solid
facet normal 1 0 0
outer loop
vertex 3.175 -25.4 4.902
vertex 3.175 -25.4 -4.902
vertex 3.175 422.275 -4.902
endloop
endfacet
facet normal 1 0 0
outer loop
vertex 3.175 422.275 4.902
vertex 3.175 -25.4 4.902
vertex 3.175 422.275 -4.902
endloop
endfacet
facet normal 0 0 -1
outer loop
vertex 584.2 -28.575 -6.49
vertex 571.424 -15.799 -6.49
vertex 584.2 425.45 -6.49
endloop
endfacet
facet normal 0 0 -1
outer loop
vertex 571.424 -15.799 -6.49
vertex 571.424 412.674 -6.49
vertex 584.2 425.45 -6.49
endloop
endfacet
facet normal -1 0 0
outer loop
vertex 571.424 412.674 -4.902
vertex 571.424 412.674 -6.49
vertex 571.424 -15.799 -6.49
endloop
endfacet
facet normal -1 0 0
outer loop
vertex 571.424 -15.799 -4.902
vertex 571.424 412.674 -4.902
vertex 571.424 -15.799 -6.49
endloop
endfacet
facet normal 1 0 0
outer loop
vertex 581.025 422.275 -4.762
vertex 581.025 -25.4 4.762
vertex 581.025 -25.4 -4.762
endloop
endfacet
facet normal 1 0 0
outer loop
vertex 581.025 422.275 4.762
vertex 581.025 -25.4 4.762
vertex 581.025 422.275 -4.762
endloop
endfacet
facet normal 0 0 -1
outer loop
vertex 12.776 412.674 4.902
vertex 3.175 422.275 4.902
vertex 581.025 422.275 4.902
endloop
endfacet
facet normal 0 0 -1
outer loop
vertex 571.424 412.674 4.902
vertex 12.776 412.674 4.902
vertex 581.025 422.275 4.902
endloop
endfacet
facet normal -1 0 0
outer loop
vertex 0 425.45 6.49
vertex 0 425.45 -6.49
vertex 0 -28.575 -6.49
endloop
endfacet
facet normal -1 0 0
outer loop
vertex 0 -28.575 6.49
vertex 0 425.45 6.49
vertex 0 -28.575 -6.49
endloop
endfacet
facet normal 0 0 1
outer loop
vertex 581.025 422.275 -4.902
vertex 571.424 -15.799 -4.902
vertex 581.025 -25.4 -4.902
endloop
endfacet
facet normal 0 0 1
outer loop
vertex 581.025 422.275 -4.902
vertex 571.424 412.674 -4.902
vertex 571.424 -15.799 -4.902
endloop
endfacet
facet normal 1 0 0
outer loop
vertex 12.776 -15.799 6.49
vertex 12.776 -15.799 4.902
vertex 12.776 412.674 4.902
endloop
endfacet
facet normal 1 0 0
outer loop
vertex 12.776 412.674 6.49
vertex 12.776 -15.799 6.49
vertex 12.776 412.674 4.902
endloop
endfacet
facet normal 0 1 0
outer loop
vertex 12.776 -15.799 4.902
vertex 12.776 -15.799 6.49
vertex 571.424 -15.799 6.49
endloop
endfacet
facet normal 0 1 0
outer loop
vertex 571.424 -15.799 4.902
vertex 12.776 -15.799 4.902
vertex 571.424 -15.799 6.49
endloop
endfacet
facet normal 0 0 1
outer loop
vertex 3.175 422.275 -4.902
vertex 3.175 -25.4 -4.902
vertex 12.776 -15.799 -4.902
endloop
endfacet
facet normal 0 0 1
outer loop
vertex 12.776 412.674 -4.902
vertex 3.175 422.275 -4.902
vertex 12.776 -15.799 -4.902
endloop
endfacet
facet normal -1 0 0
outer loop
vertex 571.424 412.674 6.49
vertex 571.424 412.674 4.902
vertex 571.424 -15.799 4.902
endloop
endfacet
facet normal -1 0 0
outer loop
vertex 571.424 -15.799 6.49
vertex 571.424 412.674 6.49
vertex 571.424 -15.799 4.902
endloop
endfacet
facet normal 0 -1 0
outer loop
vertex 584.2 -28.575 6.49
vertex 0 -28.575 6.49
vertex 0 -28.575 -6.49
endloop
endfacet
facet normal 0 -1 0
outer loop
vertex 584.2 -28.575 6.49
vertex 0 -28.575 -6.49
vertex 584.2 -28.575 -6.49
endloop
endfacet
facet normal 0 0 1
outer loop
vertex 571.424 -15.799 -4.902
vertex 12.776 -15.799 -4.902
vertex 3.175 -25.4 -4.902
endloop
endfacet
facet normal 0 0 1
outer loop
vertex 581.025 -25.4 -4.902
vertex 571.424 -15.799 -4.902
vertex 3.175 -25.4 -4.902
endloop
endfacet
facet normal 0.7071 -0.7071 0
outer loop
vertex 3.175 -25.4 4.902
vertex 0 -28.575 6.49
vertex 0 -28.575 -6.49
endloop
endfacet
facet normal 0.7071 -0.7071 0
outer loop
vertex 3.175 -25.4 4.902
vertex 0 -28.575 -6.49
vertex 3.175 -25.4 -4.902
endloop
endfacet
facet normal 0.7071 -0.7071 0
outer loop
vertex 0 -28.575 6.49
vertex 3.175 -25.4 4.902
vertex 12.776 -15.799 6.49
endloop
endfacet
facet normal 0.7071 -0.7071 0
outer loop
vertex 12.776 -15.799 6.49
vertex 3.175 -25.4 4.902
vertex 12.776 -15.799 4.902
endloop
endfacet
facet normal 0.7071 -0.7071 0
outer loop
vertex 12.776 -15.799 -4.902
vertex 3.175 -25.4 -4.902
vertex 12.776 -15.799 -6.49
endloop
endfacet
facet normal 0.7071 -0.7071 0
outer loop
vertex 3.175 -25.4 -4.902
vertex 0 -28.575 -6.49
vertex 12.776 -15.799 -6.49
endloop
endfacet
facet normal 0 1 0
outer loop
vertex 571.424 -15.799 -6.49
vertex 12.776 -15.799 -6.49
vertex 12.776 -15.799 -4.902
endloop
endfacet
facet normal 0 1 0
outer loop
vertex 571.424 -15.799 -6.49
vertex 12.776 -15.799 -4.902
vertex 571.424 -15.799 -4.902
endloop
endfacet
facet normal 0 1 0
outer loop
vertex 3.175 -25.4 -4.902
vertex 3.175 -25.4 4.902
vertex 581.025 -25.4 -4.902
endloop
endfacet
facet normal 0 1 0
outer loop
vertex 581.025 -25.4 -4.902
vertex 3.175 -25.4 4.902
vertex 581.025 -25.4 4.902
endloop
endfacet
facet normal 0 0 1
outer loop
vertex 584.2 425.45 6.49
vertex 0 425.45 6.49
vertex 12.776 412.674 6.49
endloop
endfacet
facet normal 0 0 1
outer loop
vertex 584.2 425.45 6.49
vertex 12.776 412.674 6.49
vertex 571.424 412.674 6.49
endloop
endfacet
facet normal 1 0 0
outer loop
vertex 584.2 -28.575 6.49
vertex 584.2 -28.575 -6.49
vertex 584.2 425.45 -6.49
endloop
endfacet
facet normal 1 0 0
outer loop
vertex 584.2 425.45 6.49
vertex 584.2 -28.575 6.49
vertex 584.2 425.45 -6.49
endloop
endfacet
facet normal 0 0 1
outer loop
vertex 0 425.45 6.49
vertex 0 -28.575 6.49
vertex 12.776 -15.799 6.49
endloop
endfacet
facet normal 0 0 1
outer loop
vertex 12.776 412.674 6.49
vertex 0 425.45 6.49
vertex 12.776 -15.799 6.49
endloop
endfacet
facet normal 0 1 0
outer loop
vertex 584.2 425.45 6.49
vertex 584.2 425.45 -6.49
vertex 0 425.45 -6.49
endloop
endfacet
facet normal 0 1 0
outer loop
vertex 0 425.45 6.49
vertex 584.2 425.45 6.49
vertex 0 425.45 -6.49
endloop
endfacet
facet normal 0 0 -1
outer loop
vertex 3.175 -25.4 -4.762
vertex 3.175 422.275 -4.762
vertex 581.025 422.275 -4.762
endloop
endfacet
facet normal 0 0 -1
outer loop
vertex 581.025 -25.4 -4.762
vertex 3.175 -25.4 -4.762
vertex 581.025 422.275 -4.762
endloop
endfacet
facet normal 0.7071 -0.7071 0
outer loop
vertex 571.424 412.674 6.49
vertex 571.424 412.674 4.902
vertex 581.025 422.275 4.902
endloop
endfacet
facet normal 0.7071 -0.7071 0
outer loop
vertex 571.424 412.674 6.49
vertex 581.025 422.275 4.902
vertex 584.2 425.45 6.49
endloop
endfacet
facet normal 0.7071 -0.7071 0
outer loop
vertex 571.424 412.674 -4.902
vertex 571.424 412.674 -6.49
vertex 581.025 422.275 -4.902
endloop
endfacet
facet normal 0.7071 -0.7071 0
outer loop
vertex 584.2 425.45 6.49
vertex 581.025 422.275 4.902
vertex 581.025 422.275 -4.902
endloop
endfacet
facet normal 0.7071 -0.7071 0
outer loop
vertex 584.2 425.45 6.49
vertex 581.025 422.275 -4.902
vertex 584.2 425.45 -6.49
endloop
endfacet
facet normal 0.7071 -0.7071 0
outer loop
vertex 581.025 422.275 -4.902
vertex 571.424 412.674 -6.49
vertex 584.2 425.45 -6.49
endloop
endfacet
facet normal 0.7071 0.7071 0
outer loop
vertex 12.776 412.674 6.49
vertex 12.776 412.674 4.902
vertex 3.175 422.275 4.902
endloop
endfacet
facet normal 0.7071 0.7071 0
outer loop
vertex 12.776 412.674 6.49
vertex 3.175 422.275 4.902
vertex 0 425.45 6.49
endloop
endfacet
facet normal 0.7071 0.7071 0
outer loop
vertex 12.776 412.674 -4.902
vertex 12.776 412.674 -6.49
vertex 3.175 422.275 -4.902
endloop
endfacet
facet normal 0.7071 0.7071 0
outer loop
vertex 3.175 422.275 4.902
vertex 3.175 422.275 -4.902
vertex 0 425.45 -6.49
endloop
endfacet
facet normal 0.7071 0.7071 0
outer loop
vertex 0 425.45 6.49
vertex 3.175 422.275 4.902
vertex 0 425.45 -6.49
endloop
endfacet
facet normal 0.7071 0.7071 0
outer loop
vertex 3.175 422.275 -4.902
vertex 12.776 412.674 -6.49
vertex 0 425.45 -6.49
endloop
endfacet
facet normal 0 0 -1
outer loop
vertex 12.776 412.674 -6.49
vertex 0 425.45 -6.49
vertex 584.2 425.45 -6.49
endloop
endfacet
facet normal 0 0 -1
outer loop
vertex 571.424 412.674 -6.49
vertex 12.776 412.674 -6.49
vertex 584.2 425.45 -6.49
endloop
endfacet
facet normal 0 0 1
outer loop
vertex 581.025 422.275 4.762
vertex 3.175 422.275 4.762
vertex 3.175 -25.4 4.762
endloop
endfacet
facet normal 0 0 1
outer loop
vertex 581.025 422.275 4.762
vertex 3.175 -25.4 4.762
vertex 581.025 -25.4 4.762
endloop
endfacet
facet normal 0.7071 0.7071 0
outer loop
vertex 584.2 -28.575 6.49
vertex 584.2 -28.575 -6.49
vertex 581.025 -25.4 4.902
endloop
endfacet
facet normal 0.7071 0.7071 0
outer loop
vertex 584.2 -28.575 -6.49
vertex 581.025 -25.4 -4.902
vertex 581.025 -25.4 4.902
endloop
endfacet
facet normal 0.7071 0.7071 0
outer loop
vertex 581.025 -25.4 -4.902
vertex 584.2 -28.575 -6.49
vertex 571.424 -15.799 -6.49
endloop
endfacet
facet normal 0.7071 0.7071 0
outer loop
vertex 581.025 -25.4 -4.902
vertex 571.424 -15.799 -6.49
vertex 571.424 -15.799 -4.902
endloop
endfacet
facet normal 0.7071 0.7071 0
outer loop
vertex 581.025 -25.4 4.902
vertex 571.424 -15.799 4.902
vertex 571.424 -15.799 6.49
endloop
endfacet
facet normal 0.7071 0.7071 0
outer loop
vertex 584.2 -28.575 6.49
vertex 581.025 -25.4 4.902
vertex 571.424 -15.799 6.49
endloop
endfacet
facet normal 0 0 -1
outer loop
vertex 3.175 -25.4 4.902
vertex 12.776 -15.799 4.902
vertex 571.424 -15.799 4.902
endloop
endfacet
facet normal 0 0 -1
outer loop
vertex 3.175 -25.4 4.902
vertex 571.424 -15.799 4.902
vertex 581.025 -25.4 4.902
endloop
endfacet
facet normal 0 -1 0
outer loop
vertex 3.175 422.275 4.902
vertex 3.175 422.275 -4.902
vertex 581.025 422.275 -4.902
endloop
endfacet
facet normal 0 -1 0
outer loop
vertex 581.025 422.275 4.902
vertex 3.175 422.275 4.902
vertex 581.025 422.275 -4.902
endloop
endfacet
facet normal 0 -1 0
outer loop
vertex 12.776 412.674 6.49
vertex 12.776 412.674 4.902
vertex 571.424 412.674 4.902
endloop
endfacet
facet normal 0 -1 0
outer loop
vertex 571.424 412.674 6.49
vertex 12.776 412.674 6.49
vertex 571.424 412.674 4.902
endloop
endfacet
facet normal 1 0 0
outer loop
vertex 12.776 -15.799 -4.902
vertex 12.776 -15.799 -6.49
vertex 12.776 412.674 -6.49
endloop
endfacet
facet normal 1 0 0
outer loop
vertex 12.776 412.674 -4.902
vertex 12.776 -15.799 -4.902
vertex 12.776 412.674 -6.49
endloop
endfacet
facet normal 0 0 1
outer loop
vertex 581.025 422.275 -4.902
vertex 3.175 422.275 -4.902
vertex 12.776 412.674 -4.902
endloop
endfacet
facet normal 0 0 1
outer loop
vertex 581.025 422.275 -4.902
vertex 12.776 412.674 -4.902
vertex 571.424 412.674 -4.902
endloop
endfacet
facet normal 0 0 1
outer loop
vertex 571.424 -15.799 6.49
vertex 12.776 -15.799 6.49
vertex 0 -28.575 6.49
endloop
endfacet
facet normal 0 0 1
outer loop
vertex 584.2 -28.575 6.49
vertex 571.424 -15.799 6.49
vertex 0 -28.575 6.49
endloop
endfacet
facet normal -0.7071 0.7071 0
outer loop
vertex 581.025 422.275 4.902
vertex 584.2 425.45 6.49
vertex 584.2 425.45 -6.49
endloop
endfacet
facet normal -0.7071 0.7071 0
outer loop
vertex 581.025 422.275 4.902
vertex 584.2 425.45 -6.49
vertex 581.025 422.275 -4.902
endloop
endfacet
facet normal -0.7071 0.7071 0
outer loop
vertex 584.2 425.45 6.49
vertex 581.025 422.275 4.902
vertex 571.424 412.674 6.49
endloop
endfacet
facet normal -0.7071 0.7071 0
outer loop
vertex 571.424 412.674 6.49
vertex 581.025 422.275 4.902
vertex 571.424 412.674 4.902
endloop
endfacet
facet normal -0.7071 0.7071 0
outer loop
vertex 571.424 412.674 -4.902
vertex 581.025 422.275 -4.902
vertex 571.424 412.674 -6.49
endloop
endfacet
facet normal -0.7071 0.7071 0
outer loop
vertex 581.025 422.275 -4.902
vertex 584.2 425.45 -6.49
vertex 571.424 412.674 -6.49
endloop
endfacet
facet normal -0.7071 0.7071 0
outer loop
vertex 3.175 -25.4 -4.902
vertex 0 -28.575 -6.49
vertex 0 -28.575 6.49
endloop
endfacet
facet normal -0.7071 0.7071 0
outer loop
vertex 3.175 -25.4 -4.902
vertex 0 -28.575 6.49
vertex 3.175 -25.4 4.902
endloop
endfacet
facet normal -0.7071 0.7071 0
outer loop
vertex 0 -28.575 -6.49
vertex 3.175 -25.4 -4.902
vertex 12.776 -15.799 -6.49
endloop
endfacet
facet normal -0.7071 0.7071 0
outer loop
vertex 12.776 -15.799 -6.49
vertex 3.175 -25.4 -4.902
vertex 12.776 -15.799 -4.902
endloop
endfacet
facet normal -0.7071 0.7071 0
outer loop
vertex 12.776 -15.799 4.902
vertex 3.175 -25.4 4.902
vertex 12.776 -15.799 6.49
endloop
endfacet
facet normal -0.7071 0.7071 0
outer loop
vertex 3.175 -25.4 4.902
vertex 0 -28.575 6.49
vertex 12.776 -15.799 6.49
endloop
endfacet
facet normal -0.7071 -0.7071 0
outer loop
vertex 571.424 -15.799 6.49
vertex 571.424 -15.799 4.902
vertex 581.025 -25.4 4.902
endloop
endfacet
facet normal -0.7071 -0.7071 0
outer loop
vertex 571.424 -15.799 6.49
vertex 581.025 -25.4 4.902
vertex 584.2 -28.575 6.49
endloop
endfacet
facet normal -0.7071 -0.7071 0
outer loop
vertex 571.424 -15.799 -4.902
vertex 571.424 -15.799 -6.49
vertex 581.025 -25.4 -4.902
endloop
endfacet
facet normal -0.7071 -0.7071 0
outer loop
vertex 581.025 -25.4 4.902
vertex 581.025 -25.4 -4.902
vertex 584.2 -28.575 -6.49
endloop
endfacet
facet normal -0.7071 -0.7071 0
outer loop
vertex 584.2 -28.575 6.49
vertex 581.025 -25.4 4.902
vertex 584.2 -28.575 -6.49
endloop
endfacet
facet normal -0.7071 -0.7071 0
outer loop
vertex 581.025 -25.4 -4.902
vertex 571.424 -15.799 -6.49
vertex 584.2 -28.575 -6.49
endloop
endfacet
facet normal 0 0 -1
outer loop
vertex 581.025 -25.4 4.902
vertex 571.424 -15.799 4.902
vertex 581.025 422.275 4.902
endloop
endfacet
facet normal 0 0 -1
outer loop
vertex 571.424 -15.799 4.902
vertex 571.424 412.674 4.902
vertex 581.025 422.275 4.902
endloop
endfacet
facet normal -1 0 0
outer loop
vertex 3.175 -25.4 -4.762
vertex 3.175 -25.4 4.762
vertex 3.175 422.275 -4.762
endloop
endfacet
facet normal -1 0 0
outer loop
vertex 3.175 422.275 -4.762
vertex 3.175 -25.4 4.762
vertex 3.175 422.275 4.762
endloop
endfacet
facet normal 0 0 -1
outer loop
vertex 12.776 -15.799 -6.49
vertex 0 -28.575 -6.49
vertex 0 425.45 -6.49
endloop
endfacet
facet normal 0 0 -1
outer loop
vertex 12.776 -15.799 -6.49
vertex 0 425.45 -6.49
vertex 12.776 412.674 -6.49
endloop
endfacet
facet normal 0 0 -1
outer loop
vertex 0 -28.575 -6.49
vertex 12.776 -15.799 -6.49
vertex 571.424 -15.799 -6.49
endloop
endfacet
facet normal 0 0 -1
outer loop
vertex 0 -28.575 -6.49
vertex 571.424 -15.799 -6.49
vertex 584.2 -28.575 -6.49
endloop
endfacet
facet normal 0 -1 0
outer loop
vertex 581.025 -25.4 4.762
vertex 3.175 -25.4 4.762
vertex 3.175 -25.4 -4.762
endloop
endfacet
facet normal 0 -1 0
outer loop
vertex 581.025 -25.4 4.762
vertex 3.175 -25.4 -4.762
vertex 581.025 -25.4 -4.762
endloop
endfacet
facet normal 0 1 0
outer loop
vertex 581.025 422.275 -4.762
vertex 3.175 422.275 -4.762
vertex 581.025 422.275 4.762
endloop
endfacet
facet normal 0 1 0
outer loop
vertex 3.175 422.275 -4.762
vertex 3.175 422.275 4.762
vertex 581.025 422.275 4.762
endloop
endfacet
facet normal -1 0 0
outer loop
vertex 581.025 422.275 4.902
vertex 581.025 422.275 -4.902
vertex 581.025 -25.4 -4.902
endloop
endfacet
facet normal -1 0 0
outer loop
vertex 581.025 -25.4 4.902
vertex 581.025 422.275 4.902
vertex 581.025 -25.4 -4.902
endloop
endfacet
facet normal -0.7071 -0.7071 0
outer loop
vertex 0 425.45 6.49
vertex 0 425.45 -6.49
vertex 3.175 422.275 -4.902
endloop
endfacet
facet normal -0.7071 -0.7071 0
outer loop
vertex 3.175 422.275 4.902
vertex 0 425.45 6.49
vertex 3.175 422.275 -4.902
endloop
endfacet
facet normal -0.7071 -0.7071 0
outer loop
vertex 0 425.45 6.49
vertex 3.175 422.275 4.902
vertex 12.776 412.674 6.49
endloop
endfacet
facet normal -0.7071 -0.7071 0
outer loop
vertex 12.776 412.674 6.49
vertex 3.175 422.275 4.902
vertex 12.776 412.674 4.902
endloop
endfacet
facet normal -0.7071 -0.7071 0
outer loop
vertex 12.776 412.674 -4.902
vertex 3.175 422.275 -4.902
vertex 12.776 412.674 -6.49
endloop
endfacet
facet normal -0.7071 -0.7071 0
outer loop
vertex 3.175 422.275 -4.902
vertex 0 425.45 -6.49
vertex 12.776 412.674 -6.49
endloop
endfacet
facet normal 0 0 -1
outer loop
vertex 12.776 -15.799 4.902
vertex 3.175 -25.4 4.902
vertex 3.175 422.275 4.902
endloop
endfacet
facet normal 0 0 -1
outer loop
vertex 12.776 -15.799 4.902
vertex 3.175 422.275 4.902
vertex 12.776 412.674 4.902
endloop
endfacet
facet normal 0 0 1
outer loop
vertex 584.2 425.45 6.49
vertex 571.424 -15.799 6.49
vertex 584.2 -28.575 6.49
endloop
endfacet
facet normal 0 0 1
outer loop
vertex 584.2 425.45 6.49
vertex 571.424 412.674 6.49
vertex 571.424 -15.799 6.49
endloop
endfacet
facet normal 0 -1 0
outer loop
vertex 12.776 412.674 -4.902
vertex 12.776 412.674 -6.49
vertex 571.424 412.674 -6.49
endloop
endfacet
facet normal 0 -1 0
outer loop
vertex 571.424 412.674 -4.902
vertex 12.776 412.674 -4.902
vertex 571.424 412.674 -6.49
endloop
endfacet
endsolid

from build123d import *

# Parameters (mm, degrees)
SKETCH2_W           = 577.85
SKETCH2_H           = 447.675
BOSS_EXTRUDE1_DEPTH = 4.7625
SKETCH3_W           = 584.2
SKETCH3_H           = 454.025
SKETCH3_W_2         = 577.85
SKETCH3_H_2         = 447.675
BOSS_EXTRUDE2_DEPTH = 6.4897
SKETCH4_W           = 584.2
SKETCH4_H           = 454.025
SKETCH4_W_2         = 558.6476
SKETCH4_H_2         = 428.4726
BOSS_EXTRUDE3_DEPTH = 1.5875
SPLIT1_START        = -6.4897
SPLIT1_DEPTH        = 12.9794
SPLIT1_2_DEPTH      = 1.5875
SPLIT1_START_2      = 4.9022
SPLIT1_3_DEPTH      = 1.5875
SPLIT1_4_DEPTH      = 12.9794
SPLIT1_5_DEPTH      = 1.5875
SPLIT1_6_DEPTH      = 1.5875
SPLIT1_7_DEPTH      = 12.9794
SPLIT1_8_DEPTH      = 1.5875
SPLIT1_9_DEPTH      = 1.5875
SPLIT1_START_3      = -282.77030474
SPLIT1_10_OUTLINE_W = 322.113794703
SPLIT1_10_OUTLINE_H = 12.9794
SPLIT1_10_DEPTH     = 716.067662582
SPLIT1_START_4      = -300.838580056
SPLIT1_11_OUTLINE_W = 414.886205297
SPLIT1_11_OUTLINE_H = 12.9794
SPLIT1_11_DEPTH     = 321.044156328


# Read off the part's stored shape, not the designer's step: Split1
with BuildPart() as part:
    # Sketch2 → Boss-Extrude1 (new, symmetric)
    with BuildSketch(Plane.XY):
        with Locations((292.1, 198.4375)):
            Rectangle(SKETCH2_W, SKETCH2_H)
    extrude(amount=BOSS_EXTRUDE1_DEPTH, both=True)


with BuildPart() as body_2:
    # Sketch3 → Boss-Extrude2 (new, symmetric)
    with BuildSketch(Plane.XY):
        with Locations((292.1, 198.4375)):
            Rectangle(SKETCH3_W, SKETCH3_H)
        with Locations((292.1, 198.4375)):
            Rectangle(SKETCH3_W_2, SKETCH3_H_2, mode=Mode.SUBTRACT)
    extrude(amount=BOSS_EXTRUDE2_DEPTH, both=True)

    # Sketch4 → Boss-Extrude3 (add)
    with BuildSketch(Plane.XY.offset(6.4897)):
        with Locations((292.1, 198.4375)):
            Rectangle(SKETCH4_W, SKETCH4_H)
        with Locations((292.1, 198.4375)):
            Rectangle(SKETCH4_W_2, SKETCH4_H_2, mode=Mode.SUBTRACT)
    boss_extrude3 = extrude(amount=-BOSS_EXTRUDE3_DEPTH)

    # Mirror1: Boss-Extrude3 across plane
    add(boss_extrude3.mirror(Plane.XY))

    # Split1 10 outline → Split1 10 (cut)
    with BuildSketch(Plane(origin=(0, 0, 0), x_dir=(0.707106781186548, 0.707106781186547, 0), z_dir=(0.707106781186547, -0.707106781186548, 0)).offset(SPLIT1_START_3)):
        with Locations((553.943102649, 0)):
            Rectangle(SPLIT1_10_OUTLINE_W, SPLIT1_10_OUTLINE_H)
    extrude(amount=SPLIT1_10_DEPTH, mode=Mode.SUBTRACT)

    # Split1 11 outline → Split1 11 (cut)
    with BuildSketch(Plane(origin=(0, 0, 0), x_dir=(0.707106781186548, 0.707106781186547, 0), z_dir=(0.707106781186547, -0.707106781186548, 0)).offset(SPLIT1_START_4)):
        with Locations((185.443102649, 0)):
            Rectangle(SPLIT1_11_OUTLINE_W, SPLIT1_11_OUTLINE_H)
    extrude(amount=SPLIT1_11_DEPTH, mode=Mode.SUBTRACT)


with BuildPart() as body_3:
    # Split1 outline → Split1 (new body)
    with BuildSketch(Plane.XY.offset(SPLIT1_START)):
        Polygon((581.025, -25.4), (584.2, -28.575), (584.2, 425.45), (581.025, 422.275), align=None)
    extrude(amount=SPLIT1_DEPTH)

    # Split1 2 outline → Split1 2 (add)
    with BuildSketch(Plane.XY.offset(SPLIT1_START)):
        Polygon((571.4238, -15.7988), (581.025, -25.4), (581.025, 422.275), (571.4238, 412.6738), align=None)
    extrude(amount=SPLIT1_2_DEPTH)

    # Split1 3 outline → Split1 3 (add)
    with BuildSketch(Plane.XY.offset(SPLIT1_START_2)):
        Polygon((571.4238, -15.7988), (581.025, -25.4), (581.025, 422.275), (571.4238, 412.6738), align=None)
    extrude(amount=SPLIT1_3_DEPTH)


with BuildPart() as body_4:
    # Split1 4 outline → Split1 4 (new body)
    with BuildSketch(Plane.XY.offset(SPLIT1_START)):
        Polygon((581.025, 422.275), (584.2, 425.45), (0, 425.45), (3.175, 422.275), align=None)
    extrude(amount=SPLIT1_4_DEPTH)

    # Split1 5 outline → Split1 5 (add)
    with BuildSketch(Plane.XY.offset(SPLIT1_START)):
        Polygon((571.4238, 412.6738), (581.025, 422.275), (3.175, 422.275), (12.7762, 412.6738), align=None)
    extrude(amount=SPLIT1_5_DEPTH)

    # Split1 6 outline → Split1 6 (add)
    with BuildSketch(Plane.XY.offset(SPLIT1_START_2)):
        Polygon((571.4238, 412.6738), (581.025, 422.275), (3.175, 422.275), (12.7762, 412.6738), align=None)
    extrude(amount=SPLIT1_6_DEPTH)


with BuildPart() as body_5:
    # Split1 7 outline → Split1 7 (new body)
    with BuildSketch(Plane.XY.offset(SPLIT1_START)):
        Polygon((3.175, 422.275), (0, 425.45), (0, -28.575), (3.175, -25.4), align=None)
    extrude(amount=SPLIT1_7_DEPTH)

    # Split1 8 outline → Split1 8 (add)
    with BuildSketch(Plane.XY.offset(SPLIT1_START)):
        Polygon((12.7762, 412.6738), (3.175, 422.275), (3.175, -25.4), (12.7762, -15.7988), align=None)
    extrude(amount=SPLIT1_8_DEPTH)

    # Split1 9 outline → Split1 9 (add)
    with BuildSketch(Plane.XY.offset(SPLIT1_START_2)):
        Polygon((12.7762, 412.6738), (3.175, 422.275), (3.175, -25.4), (12.7762, -15.7988), align=None)
    extrude(amount=SPLIT1_9_DEPTH)


solid = Compound([part.part, body_2.part, body_3.part, body_4.part, body_5.part])
